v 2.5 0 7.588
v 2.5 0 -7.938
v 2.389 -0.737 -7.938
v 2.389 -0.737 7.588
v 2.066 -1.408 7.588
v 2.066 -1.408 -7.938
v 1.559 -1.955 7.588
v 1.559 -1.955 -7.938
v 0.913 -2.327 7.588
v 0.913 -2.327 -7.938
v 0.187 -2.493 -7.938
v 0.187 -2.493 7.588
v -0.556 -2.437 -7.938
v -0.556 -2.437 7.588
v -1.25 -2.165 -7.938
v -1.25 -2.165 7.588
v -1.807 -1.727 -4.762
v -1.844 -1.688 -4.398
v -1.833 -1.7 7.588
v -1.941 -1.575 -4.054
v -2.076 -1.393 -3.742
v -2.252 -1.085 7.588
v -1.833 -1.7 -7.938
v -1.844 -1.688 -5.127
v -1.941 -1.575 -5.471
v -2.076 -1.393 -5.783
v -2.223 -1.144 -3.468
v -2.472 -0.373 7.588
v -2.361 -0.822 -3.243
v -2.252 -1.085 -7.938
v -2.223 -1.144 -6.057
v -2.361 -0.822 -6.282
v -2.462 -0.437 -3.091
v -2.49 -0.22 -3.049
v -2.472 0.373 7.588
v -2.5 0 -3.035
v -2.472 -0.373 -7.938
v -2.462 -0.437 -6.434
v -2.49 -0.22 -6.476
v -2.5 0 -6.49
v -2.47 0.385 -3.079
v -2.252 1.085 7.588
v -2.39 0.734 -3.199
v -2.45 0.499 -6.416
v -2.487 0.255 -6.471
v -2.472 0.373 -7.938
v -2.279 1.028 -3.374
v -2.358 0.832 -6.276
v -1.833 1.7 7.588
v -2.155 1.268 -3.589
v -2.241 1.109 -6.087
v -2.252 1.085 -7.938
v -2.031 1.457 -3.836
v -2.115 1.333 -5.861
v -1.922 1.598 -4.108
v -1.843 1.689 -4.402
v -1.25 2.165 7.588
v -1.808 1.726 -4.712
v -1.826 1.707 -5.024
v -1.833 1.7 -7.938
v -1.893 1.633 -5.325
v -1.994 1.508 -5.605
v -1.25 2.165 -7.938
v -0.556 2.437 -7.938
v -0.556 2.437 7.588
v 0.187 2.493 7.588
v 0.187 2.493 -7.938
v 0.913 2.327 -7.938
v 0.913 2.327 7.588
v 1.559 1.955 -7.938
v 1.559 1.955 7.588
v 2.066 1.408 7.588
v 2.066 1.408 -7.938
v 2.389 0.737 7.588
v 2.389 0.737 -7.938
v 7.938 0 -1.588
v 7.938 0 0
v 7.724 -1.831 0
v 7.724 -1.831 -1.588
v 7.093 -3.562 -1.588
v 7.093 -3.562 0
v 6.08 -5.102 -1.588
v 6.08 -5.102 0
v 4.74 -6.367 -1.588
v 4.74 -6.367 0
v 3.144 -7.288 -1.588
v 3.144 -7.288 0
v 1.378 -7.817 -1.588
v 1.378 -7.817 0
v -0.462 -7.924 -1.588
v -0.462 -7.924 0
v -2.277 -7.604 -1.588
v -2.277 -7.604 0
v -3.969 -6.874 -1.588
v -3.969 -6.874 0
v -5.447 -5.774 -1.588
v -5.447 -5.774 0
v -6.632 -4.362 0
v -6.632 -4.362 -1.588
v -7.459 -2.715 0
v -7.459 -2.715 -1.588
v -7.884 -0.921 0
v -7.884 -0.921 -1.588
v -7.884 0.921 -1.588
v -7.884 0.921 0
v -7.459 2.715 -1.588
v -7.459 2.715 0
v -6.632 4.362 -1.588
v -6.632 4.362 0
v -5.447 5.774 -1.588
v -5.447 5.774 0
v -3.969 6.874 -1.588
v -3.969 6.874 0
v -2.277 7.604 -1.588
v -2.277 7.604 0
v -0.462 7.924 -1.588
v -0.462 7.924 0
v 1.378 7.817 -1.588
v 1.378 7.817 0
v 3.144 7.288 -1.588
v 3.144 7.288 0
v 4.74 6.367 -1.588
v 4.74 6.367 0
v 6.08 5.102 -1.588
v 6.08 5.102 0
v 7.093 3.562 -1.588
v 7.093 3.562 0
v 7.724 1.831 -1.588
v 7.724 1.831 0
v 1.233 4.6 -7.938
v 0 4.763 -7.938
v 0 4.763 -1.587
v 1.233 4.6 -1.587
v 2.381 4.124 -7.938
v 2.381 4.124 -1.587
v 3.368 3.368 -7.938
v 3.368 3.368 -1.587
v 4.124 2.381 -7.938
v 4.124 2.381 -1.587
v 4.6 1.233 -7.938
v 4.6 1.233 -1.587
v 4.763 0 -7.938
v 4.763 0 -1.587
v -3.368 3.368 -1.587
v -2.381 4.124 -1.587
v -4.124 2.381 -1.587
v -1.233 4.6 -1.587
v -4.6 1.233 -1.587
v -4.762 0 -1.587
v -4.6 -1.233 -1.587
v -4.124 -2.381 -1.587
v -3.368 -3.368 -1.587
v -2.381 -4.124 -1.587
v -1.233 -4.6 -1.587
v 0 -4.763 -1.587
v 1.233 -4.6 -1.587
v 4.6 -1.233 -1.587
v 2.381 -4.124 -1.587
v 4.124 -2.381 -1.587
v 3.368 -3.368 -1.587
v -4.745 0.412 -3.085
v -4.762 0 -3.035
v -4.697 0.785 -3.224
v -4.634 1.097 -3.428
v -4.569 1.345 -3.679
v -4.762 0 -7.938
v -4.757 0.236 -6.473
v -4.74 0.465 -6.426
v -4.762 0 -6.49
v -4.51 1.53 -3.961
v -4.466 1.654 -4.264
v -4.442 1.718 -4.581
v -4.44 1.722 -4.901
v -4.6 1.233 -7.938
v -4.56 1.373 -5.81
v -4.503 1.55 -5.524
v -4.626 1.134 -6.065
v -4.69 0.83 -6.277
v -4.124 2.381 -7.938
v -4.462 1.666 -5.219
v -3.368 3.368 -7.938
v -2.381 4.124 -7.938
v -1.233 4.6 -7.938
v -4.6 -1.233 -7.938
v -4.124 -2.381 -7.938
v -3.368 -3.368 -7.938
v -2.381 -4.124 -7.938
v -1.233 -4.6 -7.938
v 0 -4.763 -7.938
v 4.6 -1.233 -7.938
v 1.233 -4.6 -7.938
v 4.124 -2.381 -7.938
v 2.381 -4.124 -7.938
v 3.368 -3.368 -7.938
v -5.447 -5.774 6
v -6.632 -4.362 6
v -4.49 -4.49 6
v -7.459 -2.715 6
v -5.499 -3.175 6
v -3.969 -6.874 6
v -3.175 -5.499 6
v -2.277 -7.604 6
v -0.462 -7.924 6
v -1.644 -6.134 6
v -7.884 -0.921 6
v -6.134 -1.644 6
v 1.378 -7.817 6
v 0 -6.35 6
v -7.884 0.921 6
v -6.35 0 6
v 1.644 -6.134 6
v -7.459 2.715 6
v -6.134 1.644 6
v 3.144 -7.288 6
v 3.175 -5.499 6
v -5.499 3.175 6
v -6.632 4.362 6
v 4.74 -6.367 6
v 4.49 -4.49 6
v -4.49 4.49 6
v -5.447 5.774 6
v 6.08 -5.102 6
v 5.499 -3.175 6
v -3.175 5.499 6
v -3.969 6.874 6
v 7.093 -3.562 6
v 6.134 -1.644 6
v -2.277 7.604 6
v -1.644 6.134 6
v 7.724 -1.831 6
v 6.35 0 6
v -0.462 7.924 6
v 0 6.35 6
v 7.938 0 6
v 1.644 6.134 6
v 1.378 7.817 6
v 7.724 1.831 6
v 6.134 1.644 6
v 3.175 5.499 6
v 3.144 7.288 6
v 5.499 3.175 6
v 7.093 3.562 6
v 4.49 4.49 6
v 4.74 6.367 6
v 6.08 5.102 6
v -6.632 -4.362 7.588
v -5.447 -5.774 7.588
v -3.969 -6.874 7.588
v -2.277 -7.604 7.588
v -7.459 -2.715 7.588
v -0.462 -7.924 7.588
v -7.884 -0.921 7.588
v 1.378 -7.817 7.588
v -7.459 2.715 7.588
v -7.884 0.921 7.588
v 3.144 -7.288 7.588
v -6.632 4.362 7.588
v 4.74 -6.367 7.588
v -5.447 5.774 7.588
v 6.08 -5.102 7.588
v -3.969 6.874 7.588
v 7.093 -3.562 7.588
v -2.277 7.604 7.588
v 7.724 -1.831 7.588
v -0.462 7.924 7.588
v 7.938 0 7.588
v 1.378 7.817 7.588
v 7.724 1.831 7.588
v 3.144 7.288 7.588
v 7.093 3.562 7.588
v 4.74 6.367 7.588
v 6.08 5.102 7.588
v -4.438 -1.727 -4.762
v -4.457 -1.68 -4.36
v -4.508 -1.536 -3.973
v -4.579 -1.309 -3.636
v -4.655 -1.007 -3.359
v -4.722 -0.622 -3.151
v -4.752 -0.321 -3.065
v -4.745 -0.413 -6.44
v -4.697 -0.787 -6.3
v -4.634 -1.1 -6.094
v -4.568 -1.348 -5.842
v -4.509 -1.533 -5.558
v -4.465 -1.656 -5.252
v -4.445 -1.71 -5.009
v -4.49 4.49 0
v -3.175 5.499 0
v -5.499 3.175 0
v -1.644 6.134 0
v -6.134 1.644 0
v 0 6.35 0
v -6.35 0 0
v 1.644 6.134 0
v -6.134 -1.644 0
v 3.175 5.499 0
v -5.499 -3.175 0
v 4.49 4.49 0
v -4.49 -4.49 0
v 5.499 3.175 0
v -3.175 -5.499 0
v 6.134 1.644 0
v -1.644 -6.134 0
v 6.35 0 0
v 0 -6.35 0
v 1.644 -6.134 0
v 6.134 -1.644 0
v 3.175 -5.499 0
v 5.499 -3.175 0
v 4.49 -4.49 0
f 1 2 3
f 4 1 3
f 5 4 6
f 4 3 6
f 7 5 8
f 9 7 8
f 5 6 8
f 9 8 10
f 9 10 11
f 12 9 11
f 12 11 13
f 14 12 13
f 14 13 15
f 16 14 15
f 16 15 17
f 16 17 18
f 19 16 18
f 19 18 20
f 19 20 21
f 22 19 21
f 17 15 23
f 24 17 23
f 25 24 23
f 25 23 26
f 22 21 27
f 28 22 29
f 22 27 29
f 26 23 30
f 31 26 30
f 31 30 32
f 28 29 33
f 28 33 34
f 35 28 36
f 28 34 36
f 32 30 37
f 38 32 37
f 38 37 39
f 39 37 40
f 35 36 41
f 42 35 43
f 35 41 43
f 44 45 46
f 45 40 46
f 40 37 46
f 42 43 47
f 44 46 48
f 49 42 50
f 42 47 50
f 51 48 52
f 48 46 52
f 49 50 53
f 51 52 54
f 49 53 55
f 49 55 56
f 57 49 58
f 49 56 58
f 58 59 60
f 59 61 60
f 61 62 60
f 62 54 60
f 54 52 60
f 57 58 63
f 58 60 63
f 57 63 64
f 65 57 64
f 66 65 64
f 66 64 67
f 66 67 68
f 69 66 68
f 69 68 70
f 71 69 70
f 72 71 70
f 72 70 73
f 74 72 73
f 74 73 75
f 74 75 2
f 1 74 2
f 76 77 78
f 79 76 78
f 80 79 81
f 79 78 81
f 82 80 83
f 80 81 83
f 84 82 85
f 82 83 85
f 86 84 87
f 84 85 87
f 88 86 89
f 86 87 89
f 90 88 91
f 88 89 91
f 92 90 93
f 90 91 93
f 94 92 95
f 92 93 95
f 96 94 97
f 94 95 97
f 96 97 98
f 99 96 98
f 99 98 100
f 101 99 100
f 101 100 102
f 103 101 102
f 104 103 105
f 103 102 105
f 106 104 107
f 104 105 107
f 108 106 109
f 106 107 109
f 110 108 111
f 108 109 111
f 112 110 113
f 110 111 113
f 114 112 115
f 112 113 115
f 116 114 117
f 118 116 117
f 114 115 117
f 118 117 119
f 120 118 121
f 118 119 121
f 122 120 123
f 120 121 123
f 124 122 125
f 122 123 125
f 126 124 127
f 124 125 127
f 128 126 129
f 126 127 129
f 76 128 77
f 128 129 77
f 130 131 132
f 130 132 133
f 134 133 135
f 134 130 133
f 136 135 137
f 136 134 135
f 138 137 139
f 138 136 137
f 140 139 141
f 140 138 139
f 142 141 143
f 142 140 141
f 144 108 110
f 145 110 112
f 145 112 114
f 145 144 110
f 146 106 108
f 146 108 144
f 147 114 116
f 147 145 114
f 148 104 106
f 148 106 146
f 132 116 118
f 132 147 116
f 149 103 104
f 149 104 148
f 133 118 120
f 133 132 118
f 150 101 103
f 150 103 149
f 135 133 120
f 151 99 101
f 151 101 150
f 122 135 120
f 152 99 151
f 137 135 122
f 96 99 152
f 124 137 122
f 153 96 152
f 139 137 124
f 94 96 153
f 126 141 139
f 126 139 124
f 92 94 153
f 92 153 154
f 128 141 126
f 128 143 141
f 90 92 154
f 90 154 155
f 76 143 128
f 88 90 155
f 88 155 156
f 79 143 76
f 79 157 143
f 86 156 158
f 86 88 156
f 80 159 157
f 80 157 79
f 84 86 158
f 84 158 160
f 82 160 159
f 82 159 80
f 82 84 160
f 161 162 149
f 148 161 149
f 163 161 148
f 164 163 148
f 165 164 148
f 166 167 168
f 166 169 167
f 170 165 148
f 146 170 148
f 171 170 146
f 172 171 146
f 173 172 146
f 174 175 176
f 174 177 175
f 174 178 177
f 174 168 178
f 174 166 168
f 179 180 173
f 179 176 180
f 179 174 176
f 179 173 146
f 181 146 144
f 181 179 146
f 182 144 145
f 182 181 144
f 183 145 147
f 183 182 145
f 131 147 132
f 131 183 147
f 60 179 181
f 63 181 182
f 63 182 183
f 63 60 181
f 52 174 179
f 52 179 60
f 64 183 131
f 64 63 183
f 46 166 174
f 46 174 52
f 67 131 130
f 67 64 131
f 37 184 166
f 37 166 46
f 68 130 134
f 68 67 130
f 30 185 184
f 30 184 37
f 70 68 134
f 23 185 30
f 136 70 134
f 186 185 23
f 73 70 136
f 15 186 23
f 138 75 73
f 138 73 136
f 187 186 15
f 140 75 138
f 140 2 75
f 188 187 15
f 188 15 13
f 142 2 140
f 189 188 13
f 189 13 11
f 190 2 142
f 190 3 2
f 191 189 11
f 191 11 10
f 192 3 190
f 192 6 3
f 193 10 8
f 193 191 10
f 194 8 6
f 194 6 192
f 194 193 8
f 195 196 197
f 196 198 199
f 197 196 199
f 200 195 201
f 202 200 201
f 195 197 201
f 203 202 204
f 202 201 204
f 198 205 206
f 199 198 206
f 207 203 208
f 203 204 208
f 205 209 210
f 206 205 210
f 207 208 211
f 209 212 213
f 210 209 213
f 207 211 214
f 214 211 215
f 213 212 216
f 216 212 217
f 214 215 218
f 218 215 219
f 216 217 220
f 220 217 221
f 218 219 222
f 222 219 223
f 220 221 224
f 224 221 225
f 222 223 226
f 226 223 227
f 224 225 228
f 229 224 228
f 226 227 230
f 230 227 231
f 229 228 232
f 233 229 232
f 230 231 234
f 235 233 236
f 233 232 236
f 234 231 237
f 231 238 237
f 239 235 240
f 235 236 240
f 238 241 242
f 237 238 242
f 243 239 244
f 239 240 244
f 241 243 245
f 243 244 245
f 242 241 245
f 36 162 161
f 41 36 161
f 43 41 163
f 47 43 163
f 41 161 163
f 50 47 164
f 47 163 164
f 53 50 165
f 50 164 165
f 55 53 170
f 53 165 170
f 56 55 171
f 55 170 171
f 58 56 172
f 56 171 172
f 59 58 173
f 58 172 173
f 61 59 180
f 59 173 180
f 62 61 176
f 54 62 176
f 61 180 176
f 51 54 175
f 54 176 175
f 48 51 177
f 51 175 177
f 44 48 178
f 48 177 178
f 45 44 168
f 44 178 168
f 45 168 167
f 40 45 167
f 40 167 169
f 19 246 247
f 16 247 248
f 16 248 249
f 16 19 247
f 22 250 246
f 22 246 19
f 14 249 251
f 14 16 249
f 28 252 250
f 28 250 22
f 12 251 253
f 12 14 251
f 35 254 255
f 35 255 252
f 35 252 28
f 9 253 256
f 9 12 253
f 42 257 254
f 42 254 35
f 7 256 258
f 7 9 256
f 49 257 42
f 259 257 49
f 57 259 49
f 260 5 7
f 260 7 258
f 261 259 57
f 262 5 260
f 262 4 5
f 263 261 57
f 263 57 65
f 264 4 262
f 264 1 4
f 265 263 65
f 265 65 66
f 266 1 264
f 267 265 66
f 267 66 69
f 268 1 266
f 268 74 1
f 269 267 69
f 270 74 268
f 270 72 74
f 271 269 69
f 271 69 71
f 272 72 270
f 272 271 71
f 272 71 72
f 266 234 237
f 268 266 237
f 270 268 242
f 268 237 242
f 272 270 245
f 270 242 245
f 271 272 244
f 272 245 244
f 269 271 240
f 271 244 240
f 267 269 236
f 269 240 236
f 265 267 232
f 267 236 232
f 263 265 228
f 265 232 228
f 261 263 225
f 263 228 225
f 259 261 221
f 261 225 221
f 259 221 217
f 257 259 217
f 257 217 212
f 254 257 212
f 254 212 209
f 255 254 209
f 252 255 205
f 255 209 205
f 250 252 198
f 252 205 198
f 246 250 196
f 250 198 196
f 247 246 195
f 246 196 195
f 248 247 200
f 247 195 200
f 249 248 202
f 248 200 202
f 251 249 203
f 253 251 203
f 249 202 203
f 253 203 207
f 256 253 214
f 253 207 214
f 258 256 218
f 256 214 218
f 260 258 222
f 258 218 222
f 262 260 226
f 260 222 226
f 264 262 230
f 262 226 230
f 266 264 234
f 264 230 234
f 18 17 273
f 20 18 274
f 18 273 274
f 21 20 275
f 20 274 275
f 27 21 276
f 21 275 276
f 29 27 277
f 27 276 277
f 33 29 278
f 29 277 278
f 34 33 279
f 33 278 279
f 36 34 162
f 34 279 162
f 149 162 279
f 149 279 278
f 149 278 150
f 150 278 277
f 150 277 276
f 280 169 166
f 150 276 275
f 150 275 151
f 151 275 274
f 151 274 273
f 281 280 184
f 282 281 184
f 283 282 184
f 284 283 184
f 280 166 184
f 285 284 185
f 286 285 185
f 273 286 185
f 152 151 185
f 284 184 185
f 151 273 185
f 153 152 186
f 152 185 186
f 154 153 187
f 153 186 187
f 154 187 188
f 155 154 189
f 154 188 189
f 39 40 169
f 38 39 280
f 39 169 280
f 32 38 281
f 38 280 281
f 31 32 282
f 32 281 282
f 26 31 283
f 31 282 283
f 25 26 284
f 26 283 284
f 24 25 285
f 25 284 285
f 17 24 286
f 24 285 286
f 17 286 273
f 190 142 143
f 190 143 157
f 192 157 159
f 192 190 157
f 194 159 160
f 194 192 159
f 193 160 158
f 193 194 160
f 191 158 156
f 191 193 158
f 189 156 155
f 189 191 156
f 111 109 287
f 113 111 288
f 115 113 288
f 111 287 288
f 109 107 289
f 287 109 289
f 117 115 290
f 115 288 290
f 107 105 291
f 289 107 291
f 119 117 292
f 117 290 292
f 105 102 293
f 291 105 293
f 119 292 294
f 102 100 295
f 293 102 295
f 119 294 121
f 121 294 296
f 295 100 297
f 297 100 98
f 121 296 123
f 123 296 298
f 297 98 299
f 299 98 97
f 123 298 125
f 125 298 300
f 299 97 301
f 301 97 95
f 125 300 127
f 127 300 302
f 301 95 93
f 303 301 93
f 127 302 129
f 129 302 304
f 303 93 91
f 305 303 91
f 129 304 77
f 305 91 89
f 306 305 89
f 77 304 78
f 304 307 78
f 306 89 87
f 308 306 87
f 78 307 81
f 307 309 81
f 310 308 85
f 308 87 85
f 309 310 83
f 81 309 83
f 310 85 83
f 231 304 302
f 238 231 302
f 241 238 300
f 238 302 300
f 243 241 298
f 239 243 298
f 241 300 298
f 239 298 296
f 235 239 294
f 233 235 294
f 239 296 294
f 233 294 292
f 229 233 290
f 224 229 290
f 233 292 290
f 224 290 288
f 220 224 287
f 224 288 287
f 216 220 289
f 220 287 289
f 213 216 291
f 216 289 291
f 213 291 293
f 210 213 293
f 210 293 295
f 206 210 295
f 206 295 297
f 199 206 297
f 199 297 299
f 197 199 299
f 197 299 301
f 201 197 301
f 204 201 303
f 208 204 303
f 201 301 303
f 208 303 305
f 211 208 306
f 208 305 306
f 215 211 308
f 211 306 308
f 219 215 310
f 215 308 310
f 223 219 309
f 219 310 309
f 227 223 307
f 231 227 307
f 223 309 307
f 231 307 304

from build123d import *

# Parameters (mm, degrees)
F0_R         = 6.35
F1_DEPTH     = 6
F2_R         = 7.9375
F3_DEPTH     = 1.5875
F4_R         = 7.9375
F5_DEPTH     = 1.5875
F6_W         = 9.525
F6_H         = 9.525
F7_DEPTH     = 6.35
F8_R         = 2.5
F9_DEPTH     = 15.525
F11_REACH    = 16.5631366107
F12_T1_DEPTH = 18.25625


# Not quite as in the source:
# - a fillet or chamfer that OpenCascade refuses, or shapes differently, is made with other operations: its cross-section is extruded or revolved along the edge and cut away or added


with BuildPart() as f1:
    # F0 (on Top) → F1 (new body)
    with BuildSketch(Plane.XY):
        Circle(F0_R)
    extrude(amount=F1_DEPTH)

    # F2 (on face) → F3 (join)
    with BuildSketch(Plane.XY.offset(6)):
        Circle(F2_R)
    extrude(amount=F3_DEPTH)

    # F4 (on face) → F5 (join)
    with BuildSketch(Plane(origin=(0, 0, 0), x_dir=(1, 0, 0), z_dir=(0, 0, -1))):
        Circle(F4_R)
    extrude(amount=F5_DEPTH)

    # F6 (on face) → F7 (join)
    with BuildSketch(Plane(origin=(0, 0, -1.5875), x_dir=(1, 0, 0), z_dir=(0, 0, -1))):
        Rectangle(F6_W, F6_H)
    extrude(amount=F7_DEPTH)

    # F8 (on face) → F9 (cut, through all)
    with BuildSketch(Plane(origin=(0, 0, -7.9375), x_dir=(1, 0, 0), z_dir=(0, 0, -1))):
        Circle(F8_R)
    extrude(amount=-F9_DEPTH, mode=Mode.SUBTRACT)

    f11_end = f1.faces().sort_by_distance((-2.5, 0, -0.175))[0]
    # F10 (on face) → F11 (cut, up to a face of the model that its end follows)
    with BuildSketch(Plane(origin=(-4.7625, 0, 0), x_dir=(0, -1, 0), z_dir=(-1, 0, 0))):
        with BuildLine():
            ThreePointArc((0, -3.0353), (-1.7272, -4.7625), (0, -6.4897))
            Line((0, -6.4897), (0, -3.0353))
        make_face()
        with BuildLine():
            Line((0, -3.0353), (0, -6.4897))
            ThreePointArc((0, -6.4897), (1.2213148325, -5.9838148325), (1.7272, -4.7625))
            ThreePointArc((1.7272, -4.7625), (1.2213148325, -3.5411851675), (0, -3.0353))
        make_face()
    f11_long = extrude(amount=-F11_REACH, mode=Mode.PRIVATE)
    add(split(f11_long, bisect_by=f11_end, keep=Keep.ALL, mode=Mode.PRIVATE).solids().sort_by_distance((-4.7625, 0, -4.7625))[0], mode=Mode.SUBTRACT)

    # F12: fillet of radius 4.7625 on 4 edges, made by hand

    # F12_s2 → F12_t1 (cut)
    with BuildSketch(Plane.XY.offset(-19.84375)):
        with BuildLine():
            ThreePointArc((-4.7625, 0), (-3.3675960454, -3.3675960454), (0, -4.7625))
            Line((0, -4.7625), (-4.7625, -4.7625))
            Line((-4.7625, -4.7625), (-4.7625, 0))
        make_face()
        with BuildLine():
            ThreePointArc((-4.7625, 0), (-3.3675960454, 3.3675960454), (0, 4.7625))
            Line((0, 4.7625), (-4.7625, 4.7625))
            Line((-4.7625, 4.7625), (-4.7625, 0))
        make_face()
        with BuildLine():
            ThreePointArc((0, 4.7625), (3.3675960454, 3.3675960454), (4.7625, 0))
            Line((4.7625, 0), (4.7625, 4.7625))
            Line((4.7625, 4.7625), (0, 4.7625))
        make_face()
        with BuildLine():
            ThreePointArc((4.7625, 0), (3.3675960454, -3.3675960454), (0, -4.7625))
            Line((0, -4.7625), (4.7625, -4.7625))
            Line((4.7625, -4.7625), (4.7625, 0))
        make_face()
    extrude(amount=F12_T1_DEPTH, mode=Mode.SUBTRACT)


solid = f1.part
